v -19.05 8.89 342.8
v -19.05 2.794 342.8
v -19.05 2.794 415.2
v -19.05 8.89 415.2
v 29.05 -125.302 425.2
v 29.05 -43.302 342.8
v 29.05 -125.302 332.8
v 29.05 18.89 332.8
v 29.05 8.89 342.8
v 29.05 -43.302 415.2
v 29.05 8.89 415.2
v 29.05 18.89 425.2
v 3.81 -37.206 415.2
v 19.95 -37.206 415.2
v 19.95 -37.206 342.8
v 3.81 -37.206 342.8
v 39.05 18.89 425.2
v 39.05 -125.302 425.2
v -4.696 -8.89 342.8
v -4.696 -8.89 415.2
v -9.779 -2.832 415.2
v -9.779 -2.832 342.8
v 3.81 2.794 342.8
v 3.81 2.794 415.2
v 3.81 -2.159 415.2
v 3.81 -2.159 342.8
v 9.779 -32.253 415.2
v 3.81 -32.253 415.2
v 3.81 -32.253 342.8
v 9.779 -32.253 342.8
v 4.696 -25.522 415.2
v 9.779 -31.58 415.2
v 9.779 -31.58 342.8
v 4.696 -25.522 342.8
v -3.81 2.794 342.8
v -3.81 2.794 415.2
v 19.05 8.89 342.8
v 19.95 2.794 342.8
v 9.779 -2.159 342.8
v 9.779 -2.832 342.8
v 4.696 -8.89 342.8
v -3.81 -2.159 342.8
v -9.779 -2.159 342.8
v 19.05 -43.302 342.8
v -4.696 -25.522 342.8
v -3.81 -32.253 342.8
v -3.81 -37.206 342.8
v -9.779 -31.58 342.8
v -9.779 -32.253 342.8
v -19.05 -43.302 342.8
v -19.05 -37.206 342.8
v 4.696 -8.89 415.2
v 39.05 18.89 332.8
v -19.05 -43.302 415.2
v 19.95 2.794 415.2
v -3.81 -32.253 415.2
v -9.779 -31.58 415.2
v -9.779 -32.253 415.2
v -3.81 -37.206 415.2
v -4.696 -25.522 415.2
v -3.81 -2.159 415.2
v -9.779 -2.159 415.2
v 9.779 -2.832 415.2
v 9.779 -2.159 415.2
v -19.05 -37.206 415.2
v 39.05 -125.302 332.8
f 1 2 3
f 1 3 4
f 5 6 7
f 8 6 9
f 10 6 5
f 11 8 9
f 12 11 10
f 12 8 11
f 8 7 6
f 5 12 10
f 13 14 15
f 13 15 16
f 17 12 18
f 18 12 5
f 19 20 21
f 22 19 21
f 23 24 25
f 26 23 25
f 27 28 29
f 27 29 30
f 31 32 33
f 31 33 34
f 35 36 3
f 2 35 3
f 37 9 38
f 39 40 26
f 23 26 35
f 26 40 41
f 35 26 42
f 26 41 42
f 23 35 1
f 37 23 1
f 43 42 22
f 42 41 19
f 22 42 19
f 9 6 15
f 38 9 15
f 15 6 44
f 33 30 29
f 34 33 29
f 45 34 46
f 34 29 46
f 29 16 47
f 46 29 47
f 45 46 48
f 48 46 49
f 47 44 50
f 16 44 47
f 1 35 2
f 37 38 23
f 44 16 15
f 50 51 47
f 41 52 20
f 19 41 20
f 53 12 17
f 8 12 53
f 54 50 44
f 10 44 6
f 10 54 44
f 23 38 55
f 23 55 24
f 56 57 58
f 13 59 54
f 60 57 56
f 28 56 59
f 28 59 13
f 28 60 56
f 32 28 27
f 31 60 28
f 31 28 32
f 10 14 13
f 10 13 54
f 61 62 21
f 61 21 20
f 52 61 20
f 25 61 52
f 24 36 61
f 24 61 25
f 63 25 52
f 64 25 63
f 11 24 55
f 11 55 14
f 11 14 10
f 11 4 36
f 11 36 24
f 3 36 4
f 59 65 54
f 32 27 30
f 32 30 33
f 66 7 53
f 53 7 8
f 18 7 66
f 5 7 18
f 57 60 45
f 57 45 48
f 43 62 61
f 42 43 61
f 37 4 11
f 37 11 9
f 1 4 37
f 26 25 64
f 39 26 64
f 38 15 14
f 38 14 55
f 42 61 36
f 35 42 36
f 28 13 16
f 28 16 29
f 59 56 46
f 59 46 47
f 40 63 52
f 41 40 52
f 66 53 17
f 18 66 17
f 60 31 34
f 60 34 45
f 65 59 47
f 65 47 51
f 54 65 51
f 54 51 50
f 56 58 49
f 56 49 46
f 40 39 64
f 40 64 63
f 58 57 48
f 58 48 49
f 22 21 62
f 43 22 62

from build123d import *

# Parameters (mm, degrees)
BOSS_EXTRUDE1_DEPTH = 457.2
SKETCH2_W           = 42.050956734
SKETCH2_H           = 23.599286926
CUT_EXTRUDE1_DEPTH  = 800
SKETCH3_W           = 114.4
SKETCH3_H           = 56.436670765
BOSS_EXTRUDE2_DEPTH = 10
SKETCH4_W           = 114.4
SKETCH4_H           = 4.244670765
CUT_EXTRUDE2_DEPTH  = 10
SKETCH7_W           = 48.1
SKETCH7_H           = 52.192
CUT_EXTRUDE3_DEPTH  = 42
SKETCH8_W           = 0.9
SKETCH8_H           = 40
CUT_EXTRUDE4_DEPTH  = 90
BOSS_EXTRUDE3_DEPTH = 10


with BuildPart() as part:
    # Sketch1 → Boss-Extrude1 (new body, symmetric)
    with BuildSketch(Plane.XY):
        Polygon((-19.05, 8.89), (19.05, 8.89), (19.05, 2.794), (3.81, 2.794), (3.81, -2.159), (9.779, -2.159), (9.779, -2.8321), (4.695818344, -8.89), (-4.695818344, -8.89), (-9.779, -2.8321), (-9.779, -2.159), (-3.81, -2.159), (-3.81, 2.794), (-19.05, 2.794), align=None)
    boss_extrude1 = extrude(amount=BOSS_EXTRUDE1_DEPTH, both=True)

    # Sketch2 → Cut-Extrude1 (cut)
    with BuildSketch(Plane(origin=(0, 0, -457.2), x_dir=(-1, 0, 0), z_dir=(0, 0, -1))):
        Rectangle(SKETCH2_W, SKETCH2_H)
    cut_extrude1 = extrude(amount=-CUT_EXTRUDE1_DEPTH, mode=Mode.SUBTRACT)

    # Sketch3 → Boss-Extrude2 (add)
    with BuildSketch(Plane(origin=(19.05, 0, 0), x_dir=(0, 0, -1), z_dir=(1, 0, 0))):
        with Locations((-400, -19.328335383)):
            Rectangle(SKETCH3_W, SKETCH3_H)
    extrude(amount=BOSS_EXTRUDE2_DEPTH)

    # Mirror1: Boss-Extrude1, Cut-Extrude1 across plane
    add(boss_extrude1.mirror(Plane(origin=(0, -17.206, 0), x_dir=(0, 0, 1), z_dir=(0, -1, 0))))
    add(cut_extrude1.mirror(Plane(origin=(0, -17.206, 0), x_dir=(0, 0, 1), z_dir=(0, -1, 0))), mode=Mode.SUBTRACT)

    # Sketch4 → Cut-Extrude2 (cut)
    with BuildSketch(Plane.ZY.offset(-19.05)):
        with Locations((400, -45.424335383)):
            Rectangle(SKETCH4_W, SKETCH4_H)
    extrude(amount=-CUT_EXTRUDE2_DEPTH, mode=Mode.SUBTRACT)

    # Sketch7 → Cut-Extrude3 (cut)
    with BuildSketch(Plane.XY.offset(457.2)):
        with Locations((5, -17.206)):
            Rectangle(SKETCH7_W, SKETCH7_H)
    extrude(amount=-CUT_EXTRUDE3_DEPTH, mode=Mode.SUBTRACT)

    # Sketch8 → Cut-Extrude4 (cut)
    with BuildSketch(Plane(origin=(0, 0, 342.8), x_dir=(-1, 0, 0), z_dir=(0, 0, -1))):
        with Locations((-19.5, -17.206)):
            Rectangle(SKETCH8_W, SKETCH8_H)
    extrude(amount=-CUT_EXTRUDE4_DEPTH, mode=Mode.SUBTRACT)

    # Sketch10 → Boss-Extrude3 (add)
    with BuildSketch(Plane(origin=(29.05, 0, 0), x_dir=(0, 0, -1), z_dir=(1, 0, 0))):
        Polygon((-425.2, 18.89), (-332.8, 18.89), (-332.8, -53.302), (-332.8, -125.302), (-425.2, -125.302), (-425.2, -53.302), align=None)
    extrude(amount=BOSS_EXTRUDE3_DEPTH)


solid = part.part
